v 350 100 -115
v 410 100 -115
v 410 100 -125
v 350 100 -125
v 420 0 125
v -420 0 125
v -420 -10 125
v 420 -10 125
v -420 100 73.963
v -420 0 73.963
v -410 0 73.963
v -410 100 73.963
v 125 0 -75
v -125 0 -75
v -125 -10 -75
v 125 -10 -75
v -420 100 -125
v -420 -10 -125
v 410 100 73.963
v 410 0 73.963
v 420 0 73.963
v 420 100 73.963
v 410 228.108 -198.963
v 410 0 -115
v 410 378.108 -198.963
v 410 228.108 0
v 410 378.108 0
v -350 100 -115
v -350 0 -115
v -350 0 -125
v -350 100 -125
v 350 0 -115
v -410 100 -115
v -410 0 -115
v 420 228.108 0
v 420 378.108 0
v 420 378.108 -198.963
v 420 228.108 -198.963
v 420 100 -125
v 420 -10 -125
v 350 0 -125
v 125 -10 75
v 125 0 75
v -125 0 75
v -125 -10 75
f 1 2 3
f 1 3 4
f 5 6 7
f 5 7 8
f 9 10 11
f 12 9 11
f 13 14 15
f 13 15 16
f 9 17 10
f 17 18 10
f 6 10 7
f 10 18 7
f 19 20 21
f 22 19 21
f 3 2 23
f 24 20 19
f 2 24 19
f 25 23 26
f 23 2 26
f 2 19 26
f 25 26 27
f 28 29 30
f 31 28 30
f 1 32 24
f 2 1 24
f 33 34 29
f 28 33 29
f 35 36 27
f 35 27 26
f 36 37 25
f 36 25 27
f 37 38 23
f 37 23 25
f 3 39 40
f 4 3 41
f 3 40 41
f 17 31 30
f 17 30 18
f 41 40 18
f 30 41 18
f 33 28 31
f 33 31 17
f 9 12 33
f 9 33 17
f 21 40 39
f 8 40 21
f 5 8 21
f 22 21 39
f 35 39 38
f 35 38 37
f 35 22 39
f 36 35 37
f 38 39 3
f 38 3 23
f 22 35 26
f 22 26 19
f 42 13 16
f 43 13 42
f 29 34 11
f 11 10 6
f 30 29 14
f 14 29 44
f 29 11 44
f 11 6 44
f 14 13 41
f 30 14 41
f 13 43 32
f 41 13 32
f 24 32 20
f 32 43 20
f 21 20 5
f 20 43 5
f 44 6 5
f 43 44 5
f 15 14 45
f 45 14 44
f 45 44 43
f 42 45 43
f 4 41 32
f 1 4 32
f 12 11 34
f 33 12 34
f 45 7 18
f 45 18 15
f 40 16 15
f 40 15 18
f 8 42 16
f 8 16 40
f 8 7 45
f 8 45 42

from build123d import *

# Parameters (mm, degrees)
F0_W     = 840
F0_H     = 250
F0_W_2   = 250
F0_H_2   = 150
F1_DEPTH = 10
F3_DEPTH = 100
F5_DEPTH = 10


with BuildPart() as f1:
    # F0 (on Front) → F1 (new body)
    with BuildSketch(Plane.XZ):
        Rectangle(F0_W, F0_H)
        Rectangle(F0_W_2, F0_H_2, mode=Mode.SUBTRACT)
    extrude(amount=F1_DEPTH)

    # F2 (on face) → F3 (join)
    with BuildSketch(Plane(origin=(0, 0, 0), x_dir=(-1, 0, 0), z_dir=(0, 1, 0))):
        Polygon((350, -115), (350, -125), (420, -125), (420, 73.963337), (410, 73.963337), (410, -115), align=None)
        Polygon((-410, -115), (-410, 73.963337), (-420, 73.963337), (-420, -125), (-350, -125), (-350, -115), align=None)
    extrude(amount=F3_DEPTH)

    # F4 (on face) → F5 (join)
    with BuildSketch(Plane.YZ.offset(420)):
        Polygon((228.108257, 0), (100, 73.963337), (100, -125), (228.108257, -198.963337), align=None)
        Polygon((378.108257, 0), (228.108257, 0), (228.108257, -198.963337), (378.108257, -198.963331), align=None)
    extrude(amount=-F5_DEPTH)


solid = f1.part
